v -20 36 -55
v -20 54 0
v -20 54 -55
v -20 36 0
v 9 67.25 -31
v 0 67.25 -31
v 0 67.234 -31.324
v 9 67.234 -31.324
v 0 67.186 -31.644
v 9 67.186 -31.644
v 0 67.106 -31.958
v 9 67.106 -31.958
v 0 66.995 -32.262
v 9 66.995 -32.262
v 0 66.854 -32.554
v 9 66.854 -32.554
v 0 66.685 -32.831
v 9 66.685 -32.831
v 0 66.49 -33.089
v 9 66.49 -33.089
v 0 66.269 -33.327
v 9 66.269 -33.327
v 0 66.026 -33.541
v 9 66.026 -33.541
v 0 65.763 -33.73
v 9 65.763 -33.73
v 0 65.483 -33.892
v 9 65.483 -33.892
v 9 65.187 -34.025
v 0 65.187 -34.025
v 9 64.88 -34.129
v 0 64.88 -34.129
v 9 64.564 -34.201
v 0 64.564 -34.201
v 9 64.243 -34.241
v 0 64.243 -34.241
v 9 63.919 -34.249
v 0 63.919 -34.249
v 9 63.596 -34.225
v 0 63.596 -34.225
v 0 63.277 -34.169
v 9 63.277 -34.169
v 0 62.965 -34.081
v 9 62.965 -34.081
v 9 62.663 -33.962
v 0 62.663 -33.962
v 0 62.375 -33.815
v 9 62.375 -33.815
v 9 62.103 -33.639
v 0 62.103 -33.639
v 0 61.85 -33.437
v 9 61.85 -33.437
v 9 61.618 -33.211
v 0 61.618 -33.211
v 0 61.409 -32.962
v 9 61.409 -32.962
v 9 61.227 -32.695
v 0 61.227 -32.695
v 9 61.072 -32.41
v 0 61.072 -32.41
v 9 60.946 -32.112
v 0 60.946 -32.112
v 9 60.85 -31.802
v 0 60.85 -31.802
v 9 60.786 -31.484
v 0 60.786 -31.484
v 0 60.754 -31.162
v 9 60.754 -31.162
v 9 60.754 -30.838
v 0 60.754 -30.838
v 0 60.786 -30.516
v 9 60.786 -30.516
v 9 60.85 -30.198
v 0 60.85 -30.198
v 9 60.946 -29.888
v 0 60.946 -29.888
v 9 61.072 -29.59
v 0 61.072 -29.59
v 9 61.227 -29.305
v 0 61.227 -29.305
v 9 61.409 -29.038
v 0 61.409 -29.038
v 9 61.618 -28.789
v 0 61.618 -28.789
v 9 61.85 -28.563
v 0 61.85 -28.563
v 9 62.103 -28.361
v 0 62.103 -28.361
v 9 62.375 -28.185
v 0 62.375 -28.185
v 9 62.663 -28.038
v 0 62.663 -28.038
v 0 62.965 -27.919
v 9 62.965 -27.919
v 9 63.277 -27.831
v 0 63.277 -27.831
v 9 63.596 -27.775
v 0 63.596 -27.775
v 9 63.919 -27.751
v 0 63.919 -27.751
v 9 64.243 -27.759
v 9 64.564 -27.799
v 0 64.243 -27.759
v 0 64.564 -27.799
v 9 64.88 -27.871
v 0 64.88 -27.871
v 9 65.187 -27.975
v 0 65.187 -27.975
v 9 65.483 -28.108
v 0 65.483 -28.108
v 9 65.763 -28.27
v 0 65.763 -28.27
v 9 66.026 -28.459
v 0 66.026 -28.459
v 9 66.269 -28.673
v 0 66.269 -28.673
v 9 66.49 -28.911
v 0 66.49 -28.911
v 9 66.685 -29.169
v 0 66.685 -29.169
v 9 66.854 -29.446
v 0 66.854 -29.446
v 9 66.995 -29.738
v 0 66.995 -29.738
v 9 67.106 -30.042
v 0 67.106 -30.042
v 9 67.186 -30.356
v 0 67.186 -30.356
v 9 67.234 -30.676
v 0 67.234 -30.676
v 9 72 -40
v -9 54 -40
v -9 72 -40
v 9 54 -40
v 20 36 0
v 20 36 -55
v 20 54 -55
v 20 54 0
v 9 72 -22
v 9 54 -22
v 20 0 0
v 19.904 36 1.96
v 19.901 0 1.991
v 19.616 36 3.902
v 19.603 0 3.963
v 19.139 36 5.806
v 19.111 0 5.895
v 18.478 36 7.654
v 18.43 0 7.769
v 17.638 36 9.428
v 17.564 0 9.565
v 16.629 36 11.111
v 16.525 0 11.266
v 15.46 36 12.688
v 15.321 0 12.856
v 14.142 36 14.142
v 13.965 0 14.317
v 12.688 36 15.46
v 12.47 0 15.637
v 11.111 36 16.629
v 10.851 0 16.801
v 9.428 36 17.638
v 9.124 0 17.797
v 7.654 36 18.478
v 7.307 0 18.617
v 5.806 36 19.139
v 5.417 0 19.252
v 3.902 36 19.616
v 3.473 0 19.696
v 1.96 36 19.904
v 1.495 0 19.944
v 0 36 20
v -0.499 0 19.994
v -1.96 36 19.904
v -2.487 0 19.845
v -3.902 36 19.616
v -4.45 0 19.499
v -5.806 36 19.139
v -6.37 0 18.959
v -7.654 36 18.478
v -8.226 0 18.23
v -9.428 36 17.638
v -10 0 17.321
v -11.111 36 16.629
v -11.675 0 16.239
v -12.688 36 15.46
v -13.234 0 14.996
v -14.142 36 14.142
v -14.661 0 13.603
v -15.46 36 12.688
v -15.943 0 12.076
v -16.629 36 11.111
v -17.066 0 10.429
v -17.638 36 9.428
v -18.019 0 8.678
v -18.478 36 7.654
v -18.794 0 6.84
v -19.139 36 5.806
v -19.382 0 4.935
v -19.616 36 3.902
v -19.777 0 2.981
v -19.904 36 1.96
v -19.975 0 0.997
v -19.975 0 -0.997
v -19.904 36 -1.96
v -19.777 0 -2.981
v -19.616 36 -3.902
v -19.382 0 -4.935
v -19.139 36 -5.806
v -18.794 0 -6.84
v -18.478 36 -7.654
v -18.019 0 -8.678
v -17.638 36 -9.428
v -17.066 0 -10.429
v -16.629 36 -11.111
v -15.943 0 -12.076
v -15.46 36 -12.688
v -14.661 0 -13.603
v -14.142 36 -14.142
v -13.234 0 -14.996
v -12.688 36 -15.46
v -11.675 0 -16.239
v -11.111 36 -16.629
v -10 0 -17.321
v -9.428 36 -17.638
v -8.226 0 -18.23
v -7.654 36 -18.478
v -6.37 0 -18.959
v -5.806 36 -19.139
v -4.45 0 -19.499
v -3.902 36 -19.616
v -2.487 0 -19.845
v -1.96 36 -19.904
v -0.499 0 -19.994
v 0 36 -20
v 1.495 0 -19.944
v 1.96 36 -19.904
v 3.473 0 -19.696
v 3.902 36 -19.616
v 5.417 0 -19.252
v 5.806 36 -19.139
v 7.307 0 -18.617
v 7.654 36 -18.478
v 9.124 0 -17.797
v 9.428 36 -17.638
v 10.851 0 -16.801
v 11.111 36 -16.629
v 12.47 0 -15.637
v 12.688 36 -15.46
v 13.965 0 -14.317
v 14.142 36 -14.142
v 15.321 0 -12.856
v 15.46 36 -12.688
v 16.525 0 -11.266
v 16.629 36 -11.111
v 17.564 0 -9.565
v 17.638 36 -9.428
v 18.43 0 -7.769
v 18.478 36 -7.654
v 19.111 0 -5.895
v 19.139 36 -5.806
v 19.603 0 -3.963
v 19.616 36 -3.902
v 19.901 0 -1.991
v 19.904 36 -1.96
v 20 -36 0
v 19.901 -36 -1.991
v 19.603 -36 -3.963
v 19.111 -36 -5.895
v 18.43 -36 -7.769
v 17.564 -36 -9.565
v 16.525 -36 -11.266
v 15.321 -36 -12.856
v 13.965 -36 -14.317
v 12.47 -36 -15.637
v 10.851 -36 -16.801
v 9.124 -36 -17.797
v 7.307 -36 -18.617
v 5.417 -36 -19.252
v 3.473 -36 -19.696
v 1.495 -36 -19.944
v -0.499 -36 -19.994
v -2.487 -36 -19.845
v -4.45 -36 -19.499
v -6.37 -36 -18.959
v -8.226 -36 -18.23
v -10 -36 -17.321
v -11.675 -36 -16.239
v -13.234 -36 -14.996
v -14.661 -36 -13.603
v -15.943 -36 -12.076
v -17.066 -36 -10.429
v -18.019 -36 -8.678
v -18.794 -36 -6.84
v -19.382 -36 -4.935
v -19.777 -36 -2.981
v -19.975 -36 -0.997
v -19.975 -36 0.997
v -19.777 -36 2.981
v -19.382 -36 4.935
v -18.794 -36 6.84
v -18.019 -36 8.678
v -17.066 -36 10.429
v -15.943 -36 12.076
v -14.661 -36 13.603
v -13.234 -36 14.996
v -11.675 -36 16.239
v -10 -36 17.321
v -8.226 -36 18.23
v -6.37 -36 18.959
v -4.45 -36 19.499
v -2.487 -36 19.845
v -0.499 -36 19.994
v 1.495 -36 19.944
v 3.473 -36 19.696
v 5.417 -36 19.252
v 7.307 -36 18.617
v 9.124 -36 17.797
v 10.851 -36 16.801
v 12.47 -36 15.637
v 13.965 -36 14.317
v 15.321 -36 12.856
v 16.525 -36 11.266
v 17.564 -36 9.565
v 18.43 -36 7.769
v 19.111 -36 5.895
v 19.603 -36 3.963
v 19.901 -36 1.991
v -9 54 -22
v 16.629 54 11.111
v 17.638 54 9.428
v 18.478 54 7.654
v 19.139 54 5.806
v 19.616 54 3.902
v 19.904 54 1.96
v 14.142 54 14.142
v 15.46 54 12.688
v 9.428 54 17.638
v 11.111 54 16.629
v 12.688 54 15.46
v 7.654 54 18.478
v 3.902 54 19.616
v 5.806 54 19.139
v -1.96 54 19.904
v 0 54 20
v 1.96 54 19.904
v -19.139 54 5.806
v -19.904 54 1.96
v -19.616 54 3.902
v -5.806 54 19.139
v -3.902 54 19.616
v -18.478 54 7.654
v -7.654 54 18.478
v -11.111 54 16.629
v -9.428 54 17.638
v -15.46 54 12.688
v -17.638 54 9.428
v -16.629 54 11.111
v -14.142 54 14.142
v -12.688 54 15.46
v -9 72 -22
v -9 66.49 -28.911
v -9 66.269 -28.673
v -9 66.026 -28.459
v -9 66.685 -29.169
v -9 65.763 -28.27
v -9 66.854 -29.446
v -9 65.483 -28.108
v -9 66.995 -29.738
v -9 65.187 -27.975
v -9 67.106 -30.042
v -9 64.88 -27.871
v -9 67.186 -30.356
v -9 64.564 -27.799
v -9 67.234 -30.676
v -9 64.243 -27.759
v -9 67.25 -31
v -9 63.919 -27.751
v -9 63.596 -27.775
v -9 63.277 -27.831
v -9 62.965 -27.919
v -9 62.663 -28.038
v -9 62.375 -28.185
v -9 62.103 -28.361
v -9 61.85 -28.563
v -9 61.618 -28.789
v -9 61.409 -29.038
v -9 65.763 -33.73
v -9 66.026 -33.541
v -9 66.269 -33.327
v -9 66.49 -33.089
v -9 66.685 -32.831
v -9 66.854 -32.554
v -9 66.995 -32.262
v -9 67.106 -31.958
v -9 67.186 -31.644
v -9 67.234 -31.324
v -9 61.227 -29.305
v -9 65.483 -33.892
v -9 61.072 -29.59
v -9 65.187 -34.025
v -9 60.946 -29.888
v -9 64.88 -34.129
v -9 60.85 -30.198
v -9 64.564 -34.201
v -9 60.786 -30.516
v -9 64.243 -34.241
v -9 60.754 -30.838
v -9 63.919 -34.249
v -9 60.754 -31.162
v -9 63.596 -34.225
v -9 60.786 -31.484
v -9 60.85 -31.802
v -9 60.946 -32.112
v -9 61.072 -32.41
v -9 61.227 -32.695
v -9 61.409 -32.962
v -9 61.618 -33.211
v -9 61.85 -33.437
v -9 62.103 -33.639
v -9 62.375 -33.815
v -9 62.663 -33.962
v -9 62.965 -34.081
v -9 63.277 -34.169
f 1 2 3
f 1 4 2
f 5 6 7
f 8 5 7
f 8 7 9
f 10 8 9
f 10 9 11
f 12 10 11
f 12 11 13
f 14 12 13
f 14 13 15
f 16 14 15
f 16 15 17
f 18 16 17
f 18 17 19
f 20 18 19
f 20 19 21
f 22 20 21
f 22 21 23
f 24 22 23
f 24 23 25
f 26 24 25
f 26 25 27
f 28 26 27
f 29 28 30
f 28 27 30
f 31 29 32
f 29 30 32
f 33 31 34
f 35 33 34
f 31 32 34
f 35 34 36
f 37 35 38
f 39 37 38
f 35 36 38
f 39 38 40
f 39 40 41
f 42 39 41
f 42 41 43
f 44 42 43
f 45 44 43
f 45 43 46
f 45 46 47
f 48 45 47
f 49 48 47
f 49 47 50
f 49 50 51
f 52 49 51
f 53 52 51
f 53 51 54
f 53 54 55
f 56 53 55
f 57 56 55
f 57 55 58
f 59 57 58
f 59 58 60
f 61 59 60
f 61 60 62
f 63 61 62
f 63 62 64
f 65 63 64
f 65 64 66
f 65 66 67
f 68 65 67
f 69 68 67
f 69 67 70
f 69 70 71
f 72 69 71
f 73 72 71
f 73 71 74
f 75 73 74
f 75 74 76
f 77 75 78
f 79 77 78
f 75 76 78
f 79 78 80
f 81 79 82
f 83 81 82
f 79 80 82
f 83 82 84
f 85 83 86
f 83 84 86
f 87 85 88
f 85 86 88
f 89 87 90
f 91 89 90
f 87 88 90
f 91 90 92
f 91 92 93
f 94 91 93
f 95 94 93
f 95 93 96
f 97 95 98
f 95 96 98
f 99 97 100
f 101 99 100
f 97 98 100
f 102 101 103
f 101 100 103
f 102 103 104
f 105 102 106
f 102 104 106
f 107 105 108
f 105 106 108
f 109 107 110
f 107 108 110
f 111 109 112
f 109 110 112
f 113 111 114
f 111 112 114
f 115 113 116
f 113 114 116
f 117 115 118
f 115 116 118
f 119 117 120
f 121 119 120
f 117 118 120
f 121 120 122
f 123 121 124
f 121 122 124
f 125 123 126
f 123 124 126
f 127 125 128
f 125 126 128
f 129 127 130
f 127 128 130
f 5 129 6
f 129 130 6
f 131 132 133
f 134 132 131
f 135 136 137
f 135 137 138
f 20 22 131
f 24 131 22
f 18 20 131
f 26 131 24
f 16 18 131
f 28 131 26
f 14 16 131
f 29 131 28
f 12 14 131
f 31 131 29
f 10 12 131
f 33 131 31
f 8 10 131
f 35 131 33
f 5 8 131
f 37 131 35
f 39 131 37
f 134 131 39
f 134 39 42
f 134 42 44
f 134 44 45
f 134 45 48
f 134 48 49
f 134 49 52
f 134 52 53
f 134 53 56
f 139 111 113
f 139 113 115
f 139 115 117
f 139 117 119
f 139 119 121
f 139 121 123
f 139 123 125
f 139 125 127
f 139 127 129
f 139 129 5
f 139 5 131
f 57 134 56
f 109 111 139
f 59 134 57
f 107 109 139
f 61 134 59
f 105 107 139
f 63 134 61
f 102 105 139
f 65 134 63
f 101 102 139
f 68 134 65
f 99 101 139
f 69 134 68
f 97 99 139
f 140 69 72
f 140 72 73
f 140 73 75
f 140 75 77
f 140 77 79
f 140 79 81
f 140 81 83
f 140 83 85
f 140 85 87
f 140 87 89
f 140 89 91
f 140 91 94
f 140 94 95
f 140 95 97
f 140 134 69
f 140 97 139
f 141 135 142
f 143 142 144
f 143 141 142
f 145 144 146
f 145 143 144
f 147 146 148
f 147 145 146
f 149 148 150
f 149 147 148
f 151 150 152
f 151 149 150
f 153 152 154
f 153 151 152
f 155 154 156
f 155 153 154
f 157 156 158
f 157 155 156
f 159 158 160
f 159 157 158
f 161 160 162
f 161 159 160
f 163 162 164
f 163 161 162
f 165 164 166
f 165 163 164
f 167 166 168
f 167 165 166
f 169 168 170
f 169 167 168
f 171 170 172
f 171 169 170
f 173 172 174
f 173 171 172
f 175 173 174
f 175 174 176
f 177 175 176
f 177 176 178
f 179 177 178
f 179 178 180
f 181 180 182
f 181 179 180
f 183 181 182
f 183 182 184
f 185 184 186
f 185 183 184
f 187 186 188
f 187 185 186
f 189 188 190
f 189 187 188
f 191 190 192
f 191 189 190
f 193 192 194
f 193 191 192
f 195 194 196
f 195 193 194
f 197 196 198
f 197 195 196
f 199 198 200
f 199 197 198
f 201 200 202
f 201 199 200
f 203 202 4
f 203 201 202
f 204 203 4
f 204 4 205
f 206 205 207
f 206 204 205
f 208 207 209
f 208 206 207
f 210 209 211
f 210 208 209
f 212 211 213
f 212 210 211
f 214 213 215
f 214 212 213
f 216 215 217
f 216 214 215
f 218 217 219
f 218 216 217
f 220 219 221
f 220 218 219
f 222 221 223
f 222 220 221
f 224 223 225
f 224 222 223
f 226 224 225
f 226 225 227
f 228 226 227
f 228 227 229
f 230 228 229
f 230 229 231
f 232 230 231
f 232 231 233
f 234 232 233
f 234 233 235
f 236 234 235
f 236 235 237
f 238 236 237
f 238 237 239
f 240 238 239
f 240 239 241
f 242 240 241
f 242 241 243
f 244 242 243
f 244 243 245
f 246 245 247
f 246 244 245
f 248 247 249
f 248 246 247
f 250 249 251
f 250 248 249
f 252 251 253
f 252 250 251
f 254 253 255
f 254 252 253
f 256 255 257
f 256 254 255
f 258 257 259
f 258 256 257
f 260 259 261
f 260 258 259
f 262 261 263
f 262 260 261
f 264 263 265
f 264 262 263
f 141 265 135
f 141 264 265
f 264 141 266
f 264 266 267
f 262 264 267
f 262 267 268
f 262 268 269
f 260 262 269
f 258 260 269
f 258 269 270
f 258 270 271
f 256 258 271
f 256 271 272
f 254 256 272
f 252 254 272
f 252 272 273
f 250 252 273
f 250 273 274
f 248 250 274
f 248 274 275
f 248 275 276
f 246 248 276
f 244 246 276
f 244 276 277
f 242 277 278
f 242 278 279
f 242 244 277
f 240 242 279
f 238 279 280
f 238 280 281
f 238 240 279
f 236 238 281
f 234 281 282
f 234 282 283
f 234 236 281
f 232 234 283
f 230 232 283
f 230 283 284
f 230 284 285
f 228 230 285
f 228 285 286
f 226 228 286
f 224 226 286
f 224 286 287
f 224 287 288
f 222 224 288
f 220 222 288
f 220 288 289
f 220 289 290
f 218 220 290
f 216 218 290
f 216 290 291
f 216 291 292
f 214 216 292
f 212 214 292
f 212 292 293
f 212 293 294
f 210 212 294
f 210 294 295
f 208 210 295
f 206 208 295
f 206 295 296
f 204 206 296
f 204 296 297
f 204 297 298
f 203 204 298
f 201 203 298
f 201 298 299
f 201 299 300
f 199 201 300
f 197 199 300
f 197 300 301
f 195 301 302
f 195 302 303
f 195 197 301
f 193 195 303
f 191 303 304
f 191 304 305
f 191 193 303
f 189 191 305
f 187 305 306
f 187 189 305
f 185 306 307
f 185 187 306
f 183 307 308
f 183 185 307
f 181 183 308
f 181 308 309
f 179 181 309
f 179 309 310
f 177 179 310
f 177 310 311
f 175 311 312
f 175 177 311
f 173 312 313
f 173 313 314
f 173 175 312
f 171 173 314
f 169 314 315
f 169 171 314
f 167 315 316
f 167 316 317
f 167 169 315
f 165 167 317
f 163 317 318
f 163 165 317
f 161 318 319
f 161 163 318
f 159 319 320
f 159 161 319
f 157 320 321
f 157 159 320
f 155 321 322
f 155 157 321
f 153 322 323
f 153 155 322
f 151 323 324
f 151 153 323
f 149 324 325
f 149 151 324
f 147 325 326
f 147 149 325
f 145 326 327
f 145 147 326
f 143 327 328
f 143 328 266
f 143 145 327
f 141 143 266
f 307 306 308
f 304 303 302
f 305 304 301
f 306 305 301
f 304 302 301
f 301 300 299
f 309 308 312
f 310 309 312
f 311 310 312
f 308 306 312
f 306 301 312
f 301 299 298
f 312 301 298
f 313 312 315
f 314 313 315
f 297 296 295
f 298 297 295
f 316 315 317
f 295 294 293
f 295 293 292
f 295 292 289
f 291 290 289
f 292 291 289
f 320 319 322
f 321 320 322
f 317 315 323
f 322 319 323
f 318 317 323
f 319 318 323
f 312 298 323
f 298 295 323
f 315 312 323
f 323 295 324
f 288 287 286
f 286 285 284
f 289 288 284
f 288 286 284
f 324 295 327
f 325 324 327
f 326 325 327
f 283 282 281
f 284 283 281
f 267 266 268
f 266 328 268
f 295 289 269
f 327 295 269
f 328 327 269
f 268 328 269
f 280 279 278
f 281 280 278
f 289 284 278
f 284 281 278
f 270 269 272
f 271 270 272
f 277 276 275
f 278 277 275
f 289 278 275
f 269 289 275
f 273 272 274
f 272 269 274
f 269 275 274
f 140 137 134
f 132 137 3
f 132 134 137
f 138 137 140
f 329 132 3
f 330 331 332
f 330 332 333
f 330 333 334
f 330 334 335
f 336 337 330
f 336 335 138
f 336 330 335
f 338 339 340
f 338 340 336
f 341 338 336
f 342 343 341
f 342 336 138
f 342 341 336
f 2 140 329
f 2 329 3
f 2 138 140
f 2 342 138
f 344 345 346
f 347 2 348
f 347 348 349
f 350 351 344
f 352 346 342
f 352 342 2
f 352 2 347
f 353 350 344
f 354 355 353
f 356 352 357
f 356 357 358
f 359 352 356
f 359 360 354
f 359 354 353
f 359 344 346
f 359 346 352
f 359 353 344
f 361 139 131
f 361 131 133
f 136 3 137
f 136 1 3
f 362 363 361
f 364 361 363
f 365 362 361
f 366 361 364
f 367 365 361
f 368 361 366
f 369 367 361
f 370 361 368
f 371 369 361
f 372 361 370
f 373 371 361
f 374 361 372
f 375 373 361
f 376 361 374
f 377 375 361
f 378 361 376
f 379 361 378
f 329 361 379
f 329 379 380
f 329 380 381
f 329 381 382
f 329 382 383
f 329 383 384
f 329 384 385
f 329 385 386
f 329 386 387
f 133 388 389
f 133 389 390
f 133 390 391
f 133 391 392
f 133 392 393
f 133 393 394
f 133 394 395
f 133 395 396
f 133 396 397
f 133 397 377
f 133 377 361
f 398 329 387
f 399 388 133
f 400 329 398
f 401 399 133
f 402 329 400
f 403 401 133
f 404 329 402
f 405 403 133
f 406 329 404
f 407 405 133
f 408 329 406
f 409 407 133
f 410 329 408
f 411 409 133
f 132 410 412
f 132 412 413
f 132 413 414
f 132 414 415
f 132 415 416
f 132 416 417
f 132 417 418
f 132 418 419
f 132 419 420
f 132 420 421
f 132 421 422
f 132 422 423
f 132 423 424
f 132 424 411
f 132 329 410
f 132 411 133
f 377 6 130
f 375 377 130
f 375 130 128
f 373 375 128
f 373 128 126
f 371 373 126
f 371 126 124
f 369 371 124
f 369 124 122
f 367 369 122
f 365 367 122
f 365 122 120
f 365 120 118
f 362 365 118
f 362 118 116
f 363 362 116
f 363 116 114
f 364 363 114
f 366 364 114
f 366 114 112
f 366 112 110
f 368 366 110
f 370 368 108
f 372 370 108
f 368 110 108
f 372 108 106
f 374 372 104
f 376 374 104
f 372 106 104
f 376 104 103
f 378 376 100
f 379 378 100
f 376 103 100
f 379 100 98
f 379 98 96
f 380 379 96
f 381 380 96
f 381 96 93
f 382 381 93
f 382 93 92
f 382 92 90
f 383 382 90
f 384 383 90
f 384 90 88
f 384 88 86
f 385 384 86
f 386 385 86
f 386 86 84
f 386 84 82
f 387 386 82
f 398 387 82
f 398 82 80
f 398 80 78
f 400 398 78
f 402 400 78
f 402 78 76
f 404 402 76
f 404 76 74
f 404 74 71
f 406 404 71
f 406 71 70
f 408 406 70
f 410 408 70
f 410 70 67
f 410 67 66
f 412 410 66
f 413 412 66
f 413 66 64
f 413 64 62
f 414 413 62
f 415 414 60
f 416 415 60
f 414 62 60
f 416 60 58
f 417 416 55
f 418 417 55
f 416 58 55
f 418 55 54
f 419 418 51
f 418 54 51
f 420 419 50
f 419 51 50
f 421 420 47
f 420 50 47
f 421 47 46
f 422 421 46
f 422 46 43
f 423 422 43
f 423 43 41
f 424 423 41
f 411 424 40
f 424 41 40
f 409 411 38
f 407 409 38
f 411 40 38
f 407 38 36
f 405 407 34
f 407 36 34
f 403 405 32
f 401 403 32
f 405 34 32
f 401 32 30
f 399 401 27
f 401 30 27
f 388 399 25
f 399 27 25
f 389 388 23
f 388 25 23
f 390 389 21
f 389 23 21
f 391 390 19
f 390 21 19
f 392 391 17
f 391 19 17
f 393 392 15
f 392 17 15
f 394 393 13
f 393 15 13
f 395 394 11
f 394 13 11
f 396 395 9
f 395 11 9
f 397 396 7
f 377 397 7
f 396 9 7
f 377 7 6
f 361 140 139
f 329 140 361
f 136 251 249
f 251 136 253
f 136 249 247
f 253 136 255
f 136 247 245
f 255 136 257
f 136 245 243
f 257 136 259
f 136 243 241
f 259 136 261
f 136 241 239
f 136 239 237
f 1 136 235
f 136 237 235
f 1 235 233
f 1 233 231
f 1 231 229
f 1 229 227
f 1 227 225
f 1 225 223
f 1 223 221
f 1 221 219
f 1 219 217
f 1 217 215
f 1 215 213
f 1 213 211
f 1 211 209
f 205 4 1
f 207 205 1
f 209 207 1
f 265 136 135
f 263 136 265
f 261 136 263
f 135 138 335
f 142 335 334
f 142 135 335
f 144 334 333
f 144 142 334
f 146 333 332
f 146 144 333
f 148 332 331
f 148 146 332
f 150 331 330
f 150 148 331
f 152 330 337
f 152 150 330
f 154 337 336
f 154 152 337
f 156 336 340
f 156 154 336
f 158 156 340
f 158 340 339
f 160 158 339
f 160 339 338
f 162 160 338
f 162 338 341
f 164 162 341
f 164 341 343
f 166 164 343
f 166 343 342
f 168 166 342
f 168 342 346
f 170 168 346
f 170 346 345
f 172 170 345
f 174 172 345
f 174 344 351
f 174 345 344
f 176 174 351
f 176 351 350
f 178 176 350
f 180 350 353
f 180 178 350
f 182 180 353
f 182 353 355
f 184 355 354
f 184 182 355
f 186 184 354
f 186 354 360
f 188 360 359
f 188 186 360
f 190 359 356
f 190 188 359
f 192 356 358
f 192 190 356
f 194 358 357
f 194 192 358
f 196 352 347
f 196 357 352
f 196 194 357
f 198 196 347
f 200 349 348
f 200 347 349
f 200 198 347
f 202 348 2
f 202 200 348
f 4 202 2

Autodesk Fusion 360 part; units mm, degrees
sketch "Sketch1" plane through (0, 0, 0) normal (0, 0, 1) x (1, 0, 0)
sketch "Sketch2" plane through (0, 0, 0) normal (1, 0, 0) x (0, 1, 0)
  line L0 (36, -20) -> (-36, -20)
  line L1 (-36, -20) -> (-36, 20)
  line L2 (-36, 20) -> (36, 20)
  line L3 (36, 20) -> (36, -20)
  line L4 (36, -20) -> (-36, 20) construction
  line L5 (-36, -20) -> (36, 20) construction
  dimension "d1" = 72
  dimension "d2" = 40
sketch "Sketch3" plane through (0, 0, 0) normal (0, 1, 0) x (1, 0, 0)
  circle A0 centre (0, 0) radius 20
  dimension "d3" = 40
extrude "Extrude1" add sketch "Sketch3" along normal mid plane 72
sketch "Sketch4" plane through (0, 0, 0) normal (0, 1, 0) x (1, 0, 0)
sketch "Sketch5" plane through (0, 36, 0) normal (0, 1, 0) x (-1, 0, 0)
  circle A0 centre (0, 0) radius 20
  circle A1 centre (0, 0) radius 20
  line L0 (0, 20) -> (0, -55) construction
  line L1 (20, 0) -> (20, -55)
  line L2 (20, -55) -> (-20, -55)
  line L3 (-20, -55) -> (-20, 0)
  line L4 (0, -55) -> (0, -31) construction
  line L5 (9, -40) -> (-9, -40)
  line L6 (-9, -40) -> (-9, -22)
  line L7 (-9, -22) -> (9, -22)
  line L8 (9, -22) -> (9, -40)
  line L9 (9, -40) -> (-9, -22) construction
  line L10 (-9, -40) -> (9, -22) construction
  line L11 (20, -19.9504) -> (-20, -19.9504)
  line L12 (-20, -19.9504) -> (-20, -49.9504)
  line L13 (-20, -49.9504) -> (20, -49.9504)
  line L14 (20, -49.9504) -> (20, -19.9504)
  point P0 (0, -31)
  dimension "d6" = 75
  dimension "d11" = 24
  dimension "d12" = 18
  dimension "d21" = 30
extrude "Extrude2" add sketch "Sketch5" along normal blind 18 contours A0 A1 L11 | A0 A1 L1 L11 | A0 A1 L3 L11 | A0 A1 L1 L3 L11 L12 L13 L14 | A0 A1 L11 | L1 L2 L3 L13 | L5 L6 L7 L8
extrude "Extrude4" add sketch "Sketch5" along normal blind 36 contours L5 L6 L7 L8
sketch "Sketch6" plane through (0, 0, 0) normal (1, 0, 0) x (0, 1, 0)
  line L0 (54, -22) -> (72, -40) construction
  line L1 (72, -40) -> (72, -22) construction
  line L2 (72, -22) -> (54, -40) construction
  line L3 (54, -40) -> (63, -31) construction
  line L4 (54, -31) -> (64, -31) construction
  circle A0 centre (64, -31) radius 3.25
  dimension "d17" = 10
  dimension "d18" = 6.5
extrude "Extrude5" cut sketch "Sketch6" along normal mid plane 64
extrude "Extrude6" [suppressed]
extrude "Extrude3" [suppressed]
